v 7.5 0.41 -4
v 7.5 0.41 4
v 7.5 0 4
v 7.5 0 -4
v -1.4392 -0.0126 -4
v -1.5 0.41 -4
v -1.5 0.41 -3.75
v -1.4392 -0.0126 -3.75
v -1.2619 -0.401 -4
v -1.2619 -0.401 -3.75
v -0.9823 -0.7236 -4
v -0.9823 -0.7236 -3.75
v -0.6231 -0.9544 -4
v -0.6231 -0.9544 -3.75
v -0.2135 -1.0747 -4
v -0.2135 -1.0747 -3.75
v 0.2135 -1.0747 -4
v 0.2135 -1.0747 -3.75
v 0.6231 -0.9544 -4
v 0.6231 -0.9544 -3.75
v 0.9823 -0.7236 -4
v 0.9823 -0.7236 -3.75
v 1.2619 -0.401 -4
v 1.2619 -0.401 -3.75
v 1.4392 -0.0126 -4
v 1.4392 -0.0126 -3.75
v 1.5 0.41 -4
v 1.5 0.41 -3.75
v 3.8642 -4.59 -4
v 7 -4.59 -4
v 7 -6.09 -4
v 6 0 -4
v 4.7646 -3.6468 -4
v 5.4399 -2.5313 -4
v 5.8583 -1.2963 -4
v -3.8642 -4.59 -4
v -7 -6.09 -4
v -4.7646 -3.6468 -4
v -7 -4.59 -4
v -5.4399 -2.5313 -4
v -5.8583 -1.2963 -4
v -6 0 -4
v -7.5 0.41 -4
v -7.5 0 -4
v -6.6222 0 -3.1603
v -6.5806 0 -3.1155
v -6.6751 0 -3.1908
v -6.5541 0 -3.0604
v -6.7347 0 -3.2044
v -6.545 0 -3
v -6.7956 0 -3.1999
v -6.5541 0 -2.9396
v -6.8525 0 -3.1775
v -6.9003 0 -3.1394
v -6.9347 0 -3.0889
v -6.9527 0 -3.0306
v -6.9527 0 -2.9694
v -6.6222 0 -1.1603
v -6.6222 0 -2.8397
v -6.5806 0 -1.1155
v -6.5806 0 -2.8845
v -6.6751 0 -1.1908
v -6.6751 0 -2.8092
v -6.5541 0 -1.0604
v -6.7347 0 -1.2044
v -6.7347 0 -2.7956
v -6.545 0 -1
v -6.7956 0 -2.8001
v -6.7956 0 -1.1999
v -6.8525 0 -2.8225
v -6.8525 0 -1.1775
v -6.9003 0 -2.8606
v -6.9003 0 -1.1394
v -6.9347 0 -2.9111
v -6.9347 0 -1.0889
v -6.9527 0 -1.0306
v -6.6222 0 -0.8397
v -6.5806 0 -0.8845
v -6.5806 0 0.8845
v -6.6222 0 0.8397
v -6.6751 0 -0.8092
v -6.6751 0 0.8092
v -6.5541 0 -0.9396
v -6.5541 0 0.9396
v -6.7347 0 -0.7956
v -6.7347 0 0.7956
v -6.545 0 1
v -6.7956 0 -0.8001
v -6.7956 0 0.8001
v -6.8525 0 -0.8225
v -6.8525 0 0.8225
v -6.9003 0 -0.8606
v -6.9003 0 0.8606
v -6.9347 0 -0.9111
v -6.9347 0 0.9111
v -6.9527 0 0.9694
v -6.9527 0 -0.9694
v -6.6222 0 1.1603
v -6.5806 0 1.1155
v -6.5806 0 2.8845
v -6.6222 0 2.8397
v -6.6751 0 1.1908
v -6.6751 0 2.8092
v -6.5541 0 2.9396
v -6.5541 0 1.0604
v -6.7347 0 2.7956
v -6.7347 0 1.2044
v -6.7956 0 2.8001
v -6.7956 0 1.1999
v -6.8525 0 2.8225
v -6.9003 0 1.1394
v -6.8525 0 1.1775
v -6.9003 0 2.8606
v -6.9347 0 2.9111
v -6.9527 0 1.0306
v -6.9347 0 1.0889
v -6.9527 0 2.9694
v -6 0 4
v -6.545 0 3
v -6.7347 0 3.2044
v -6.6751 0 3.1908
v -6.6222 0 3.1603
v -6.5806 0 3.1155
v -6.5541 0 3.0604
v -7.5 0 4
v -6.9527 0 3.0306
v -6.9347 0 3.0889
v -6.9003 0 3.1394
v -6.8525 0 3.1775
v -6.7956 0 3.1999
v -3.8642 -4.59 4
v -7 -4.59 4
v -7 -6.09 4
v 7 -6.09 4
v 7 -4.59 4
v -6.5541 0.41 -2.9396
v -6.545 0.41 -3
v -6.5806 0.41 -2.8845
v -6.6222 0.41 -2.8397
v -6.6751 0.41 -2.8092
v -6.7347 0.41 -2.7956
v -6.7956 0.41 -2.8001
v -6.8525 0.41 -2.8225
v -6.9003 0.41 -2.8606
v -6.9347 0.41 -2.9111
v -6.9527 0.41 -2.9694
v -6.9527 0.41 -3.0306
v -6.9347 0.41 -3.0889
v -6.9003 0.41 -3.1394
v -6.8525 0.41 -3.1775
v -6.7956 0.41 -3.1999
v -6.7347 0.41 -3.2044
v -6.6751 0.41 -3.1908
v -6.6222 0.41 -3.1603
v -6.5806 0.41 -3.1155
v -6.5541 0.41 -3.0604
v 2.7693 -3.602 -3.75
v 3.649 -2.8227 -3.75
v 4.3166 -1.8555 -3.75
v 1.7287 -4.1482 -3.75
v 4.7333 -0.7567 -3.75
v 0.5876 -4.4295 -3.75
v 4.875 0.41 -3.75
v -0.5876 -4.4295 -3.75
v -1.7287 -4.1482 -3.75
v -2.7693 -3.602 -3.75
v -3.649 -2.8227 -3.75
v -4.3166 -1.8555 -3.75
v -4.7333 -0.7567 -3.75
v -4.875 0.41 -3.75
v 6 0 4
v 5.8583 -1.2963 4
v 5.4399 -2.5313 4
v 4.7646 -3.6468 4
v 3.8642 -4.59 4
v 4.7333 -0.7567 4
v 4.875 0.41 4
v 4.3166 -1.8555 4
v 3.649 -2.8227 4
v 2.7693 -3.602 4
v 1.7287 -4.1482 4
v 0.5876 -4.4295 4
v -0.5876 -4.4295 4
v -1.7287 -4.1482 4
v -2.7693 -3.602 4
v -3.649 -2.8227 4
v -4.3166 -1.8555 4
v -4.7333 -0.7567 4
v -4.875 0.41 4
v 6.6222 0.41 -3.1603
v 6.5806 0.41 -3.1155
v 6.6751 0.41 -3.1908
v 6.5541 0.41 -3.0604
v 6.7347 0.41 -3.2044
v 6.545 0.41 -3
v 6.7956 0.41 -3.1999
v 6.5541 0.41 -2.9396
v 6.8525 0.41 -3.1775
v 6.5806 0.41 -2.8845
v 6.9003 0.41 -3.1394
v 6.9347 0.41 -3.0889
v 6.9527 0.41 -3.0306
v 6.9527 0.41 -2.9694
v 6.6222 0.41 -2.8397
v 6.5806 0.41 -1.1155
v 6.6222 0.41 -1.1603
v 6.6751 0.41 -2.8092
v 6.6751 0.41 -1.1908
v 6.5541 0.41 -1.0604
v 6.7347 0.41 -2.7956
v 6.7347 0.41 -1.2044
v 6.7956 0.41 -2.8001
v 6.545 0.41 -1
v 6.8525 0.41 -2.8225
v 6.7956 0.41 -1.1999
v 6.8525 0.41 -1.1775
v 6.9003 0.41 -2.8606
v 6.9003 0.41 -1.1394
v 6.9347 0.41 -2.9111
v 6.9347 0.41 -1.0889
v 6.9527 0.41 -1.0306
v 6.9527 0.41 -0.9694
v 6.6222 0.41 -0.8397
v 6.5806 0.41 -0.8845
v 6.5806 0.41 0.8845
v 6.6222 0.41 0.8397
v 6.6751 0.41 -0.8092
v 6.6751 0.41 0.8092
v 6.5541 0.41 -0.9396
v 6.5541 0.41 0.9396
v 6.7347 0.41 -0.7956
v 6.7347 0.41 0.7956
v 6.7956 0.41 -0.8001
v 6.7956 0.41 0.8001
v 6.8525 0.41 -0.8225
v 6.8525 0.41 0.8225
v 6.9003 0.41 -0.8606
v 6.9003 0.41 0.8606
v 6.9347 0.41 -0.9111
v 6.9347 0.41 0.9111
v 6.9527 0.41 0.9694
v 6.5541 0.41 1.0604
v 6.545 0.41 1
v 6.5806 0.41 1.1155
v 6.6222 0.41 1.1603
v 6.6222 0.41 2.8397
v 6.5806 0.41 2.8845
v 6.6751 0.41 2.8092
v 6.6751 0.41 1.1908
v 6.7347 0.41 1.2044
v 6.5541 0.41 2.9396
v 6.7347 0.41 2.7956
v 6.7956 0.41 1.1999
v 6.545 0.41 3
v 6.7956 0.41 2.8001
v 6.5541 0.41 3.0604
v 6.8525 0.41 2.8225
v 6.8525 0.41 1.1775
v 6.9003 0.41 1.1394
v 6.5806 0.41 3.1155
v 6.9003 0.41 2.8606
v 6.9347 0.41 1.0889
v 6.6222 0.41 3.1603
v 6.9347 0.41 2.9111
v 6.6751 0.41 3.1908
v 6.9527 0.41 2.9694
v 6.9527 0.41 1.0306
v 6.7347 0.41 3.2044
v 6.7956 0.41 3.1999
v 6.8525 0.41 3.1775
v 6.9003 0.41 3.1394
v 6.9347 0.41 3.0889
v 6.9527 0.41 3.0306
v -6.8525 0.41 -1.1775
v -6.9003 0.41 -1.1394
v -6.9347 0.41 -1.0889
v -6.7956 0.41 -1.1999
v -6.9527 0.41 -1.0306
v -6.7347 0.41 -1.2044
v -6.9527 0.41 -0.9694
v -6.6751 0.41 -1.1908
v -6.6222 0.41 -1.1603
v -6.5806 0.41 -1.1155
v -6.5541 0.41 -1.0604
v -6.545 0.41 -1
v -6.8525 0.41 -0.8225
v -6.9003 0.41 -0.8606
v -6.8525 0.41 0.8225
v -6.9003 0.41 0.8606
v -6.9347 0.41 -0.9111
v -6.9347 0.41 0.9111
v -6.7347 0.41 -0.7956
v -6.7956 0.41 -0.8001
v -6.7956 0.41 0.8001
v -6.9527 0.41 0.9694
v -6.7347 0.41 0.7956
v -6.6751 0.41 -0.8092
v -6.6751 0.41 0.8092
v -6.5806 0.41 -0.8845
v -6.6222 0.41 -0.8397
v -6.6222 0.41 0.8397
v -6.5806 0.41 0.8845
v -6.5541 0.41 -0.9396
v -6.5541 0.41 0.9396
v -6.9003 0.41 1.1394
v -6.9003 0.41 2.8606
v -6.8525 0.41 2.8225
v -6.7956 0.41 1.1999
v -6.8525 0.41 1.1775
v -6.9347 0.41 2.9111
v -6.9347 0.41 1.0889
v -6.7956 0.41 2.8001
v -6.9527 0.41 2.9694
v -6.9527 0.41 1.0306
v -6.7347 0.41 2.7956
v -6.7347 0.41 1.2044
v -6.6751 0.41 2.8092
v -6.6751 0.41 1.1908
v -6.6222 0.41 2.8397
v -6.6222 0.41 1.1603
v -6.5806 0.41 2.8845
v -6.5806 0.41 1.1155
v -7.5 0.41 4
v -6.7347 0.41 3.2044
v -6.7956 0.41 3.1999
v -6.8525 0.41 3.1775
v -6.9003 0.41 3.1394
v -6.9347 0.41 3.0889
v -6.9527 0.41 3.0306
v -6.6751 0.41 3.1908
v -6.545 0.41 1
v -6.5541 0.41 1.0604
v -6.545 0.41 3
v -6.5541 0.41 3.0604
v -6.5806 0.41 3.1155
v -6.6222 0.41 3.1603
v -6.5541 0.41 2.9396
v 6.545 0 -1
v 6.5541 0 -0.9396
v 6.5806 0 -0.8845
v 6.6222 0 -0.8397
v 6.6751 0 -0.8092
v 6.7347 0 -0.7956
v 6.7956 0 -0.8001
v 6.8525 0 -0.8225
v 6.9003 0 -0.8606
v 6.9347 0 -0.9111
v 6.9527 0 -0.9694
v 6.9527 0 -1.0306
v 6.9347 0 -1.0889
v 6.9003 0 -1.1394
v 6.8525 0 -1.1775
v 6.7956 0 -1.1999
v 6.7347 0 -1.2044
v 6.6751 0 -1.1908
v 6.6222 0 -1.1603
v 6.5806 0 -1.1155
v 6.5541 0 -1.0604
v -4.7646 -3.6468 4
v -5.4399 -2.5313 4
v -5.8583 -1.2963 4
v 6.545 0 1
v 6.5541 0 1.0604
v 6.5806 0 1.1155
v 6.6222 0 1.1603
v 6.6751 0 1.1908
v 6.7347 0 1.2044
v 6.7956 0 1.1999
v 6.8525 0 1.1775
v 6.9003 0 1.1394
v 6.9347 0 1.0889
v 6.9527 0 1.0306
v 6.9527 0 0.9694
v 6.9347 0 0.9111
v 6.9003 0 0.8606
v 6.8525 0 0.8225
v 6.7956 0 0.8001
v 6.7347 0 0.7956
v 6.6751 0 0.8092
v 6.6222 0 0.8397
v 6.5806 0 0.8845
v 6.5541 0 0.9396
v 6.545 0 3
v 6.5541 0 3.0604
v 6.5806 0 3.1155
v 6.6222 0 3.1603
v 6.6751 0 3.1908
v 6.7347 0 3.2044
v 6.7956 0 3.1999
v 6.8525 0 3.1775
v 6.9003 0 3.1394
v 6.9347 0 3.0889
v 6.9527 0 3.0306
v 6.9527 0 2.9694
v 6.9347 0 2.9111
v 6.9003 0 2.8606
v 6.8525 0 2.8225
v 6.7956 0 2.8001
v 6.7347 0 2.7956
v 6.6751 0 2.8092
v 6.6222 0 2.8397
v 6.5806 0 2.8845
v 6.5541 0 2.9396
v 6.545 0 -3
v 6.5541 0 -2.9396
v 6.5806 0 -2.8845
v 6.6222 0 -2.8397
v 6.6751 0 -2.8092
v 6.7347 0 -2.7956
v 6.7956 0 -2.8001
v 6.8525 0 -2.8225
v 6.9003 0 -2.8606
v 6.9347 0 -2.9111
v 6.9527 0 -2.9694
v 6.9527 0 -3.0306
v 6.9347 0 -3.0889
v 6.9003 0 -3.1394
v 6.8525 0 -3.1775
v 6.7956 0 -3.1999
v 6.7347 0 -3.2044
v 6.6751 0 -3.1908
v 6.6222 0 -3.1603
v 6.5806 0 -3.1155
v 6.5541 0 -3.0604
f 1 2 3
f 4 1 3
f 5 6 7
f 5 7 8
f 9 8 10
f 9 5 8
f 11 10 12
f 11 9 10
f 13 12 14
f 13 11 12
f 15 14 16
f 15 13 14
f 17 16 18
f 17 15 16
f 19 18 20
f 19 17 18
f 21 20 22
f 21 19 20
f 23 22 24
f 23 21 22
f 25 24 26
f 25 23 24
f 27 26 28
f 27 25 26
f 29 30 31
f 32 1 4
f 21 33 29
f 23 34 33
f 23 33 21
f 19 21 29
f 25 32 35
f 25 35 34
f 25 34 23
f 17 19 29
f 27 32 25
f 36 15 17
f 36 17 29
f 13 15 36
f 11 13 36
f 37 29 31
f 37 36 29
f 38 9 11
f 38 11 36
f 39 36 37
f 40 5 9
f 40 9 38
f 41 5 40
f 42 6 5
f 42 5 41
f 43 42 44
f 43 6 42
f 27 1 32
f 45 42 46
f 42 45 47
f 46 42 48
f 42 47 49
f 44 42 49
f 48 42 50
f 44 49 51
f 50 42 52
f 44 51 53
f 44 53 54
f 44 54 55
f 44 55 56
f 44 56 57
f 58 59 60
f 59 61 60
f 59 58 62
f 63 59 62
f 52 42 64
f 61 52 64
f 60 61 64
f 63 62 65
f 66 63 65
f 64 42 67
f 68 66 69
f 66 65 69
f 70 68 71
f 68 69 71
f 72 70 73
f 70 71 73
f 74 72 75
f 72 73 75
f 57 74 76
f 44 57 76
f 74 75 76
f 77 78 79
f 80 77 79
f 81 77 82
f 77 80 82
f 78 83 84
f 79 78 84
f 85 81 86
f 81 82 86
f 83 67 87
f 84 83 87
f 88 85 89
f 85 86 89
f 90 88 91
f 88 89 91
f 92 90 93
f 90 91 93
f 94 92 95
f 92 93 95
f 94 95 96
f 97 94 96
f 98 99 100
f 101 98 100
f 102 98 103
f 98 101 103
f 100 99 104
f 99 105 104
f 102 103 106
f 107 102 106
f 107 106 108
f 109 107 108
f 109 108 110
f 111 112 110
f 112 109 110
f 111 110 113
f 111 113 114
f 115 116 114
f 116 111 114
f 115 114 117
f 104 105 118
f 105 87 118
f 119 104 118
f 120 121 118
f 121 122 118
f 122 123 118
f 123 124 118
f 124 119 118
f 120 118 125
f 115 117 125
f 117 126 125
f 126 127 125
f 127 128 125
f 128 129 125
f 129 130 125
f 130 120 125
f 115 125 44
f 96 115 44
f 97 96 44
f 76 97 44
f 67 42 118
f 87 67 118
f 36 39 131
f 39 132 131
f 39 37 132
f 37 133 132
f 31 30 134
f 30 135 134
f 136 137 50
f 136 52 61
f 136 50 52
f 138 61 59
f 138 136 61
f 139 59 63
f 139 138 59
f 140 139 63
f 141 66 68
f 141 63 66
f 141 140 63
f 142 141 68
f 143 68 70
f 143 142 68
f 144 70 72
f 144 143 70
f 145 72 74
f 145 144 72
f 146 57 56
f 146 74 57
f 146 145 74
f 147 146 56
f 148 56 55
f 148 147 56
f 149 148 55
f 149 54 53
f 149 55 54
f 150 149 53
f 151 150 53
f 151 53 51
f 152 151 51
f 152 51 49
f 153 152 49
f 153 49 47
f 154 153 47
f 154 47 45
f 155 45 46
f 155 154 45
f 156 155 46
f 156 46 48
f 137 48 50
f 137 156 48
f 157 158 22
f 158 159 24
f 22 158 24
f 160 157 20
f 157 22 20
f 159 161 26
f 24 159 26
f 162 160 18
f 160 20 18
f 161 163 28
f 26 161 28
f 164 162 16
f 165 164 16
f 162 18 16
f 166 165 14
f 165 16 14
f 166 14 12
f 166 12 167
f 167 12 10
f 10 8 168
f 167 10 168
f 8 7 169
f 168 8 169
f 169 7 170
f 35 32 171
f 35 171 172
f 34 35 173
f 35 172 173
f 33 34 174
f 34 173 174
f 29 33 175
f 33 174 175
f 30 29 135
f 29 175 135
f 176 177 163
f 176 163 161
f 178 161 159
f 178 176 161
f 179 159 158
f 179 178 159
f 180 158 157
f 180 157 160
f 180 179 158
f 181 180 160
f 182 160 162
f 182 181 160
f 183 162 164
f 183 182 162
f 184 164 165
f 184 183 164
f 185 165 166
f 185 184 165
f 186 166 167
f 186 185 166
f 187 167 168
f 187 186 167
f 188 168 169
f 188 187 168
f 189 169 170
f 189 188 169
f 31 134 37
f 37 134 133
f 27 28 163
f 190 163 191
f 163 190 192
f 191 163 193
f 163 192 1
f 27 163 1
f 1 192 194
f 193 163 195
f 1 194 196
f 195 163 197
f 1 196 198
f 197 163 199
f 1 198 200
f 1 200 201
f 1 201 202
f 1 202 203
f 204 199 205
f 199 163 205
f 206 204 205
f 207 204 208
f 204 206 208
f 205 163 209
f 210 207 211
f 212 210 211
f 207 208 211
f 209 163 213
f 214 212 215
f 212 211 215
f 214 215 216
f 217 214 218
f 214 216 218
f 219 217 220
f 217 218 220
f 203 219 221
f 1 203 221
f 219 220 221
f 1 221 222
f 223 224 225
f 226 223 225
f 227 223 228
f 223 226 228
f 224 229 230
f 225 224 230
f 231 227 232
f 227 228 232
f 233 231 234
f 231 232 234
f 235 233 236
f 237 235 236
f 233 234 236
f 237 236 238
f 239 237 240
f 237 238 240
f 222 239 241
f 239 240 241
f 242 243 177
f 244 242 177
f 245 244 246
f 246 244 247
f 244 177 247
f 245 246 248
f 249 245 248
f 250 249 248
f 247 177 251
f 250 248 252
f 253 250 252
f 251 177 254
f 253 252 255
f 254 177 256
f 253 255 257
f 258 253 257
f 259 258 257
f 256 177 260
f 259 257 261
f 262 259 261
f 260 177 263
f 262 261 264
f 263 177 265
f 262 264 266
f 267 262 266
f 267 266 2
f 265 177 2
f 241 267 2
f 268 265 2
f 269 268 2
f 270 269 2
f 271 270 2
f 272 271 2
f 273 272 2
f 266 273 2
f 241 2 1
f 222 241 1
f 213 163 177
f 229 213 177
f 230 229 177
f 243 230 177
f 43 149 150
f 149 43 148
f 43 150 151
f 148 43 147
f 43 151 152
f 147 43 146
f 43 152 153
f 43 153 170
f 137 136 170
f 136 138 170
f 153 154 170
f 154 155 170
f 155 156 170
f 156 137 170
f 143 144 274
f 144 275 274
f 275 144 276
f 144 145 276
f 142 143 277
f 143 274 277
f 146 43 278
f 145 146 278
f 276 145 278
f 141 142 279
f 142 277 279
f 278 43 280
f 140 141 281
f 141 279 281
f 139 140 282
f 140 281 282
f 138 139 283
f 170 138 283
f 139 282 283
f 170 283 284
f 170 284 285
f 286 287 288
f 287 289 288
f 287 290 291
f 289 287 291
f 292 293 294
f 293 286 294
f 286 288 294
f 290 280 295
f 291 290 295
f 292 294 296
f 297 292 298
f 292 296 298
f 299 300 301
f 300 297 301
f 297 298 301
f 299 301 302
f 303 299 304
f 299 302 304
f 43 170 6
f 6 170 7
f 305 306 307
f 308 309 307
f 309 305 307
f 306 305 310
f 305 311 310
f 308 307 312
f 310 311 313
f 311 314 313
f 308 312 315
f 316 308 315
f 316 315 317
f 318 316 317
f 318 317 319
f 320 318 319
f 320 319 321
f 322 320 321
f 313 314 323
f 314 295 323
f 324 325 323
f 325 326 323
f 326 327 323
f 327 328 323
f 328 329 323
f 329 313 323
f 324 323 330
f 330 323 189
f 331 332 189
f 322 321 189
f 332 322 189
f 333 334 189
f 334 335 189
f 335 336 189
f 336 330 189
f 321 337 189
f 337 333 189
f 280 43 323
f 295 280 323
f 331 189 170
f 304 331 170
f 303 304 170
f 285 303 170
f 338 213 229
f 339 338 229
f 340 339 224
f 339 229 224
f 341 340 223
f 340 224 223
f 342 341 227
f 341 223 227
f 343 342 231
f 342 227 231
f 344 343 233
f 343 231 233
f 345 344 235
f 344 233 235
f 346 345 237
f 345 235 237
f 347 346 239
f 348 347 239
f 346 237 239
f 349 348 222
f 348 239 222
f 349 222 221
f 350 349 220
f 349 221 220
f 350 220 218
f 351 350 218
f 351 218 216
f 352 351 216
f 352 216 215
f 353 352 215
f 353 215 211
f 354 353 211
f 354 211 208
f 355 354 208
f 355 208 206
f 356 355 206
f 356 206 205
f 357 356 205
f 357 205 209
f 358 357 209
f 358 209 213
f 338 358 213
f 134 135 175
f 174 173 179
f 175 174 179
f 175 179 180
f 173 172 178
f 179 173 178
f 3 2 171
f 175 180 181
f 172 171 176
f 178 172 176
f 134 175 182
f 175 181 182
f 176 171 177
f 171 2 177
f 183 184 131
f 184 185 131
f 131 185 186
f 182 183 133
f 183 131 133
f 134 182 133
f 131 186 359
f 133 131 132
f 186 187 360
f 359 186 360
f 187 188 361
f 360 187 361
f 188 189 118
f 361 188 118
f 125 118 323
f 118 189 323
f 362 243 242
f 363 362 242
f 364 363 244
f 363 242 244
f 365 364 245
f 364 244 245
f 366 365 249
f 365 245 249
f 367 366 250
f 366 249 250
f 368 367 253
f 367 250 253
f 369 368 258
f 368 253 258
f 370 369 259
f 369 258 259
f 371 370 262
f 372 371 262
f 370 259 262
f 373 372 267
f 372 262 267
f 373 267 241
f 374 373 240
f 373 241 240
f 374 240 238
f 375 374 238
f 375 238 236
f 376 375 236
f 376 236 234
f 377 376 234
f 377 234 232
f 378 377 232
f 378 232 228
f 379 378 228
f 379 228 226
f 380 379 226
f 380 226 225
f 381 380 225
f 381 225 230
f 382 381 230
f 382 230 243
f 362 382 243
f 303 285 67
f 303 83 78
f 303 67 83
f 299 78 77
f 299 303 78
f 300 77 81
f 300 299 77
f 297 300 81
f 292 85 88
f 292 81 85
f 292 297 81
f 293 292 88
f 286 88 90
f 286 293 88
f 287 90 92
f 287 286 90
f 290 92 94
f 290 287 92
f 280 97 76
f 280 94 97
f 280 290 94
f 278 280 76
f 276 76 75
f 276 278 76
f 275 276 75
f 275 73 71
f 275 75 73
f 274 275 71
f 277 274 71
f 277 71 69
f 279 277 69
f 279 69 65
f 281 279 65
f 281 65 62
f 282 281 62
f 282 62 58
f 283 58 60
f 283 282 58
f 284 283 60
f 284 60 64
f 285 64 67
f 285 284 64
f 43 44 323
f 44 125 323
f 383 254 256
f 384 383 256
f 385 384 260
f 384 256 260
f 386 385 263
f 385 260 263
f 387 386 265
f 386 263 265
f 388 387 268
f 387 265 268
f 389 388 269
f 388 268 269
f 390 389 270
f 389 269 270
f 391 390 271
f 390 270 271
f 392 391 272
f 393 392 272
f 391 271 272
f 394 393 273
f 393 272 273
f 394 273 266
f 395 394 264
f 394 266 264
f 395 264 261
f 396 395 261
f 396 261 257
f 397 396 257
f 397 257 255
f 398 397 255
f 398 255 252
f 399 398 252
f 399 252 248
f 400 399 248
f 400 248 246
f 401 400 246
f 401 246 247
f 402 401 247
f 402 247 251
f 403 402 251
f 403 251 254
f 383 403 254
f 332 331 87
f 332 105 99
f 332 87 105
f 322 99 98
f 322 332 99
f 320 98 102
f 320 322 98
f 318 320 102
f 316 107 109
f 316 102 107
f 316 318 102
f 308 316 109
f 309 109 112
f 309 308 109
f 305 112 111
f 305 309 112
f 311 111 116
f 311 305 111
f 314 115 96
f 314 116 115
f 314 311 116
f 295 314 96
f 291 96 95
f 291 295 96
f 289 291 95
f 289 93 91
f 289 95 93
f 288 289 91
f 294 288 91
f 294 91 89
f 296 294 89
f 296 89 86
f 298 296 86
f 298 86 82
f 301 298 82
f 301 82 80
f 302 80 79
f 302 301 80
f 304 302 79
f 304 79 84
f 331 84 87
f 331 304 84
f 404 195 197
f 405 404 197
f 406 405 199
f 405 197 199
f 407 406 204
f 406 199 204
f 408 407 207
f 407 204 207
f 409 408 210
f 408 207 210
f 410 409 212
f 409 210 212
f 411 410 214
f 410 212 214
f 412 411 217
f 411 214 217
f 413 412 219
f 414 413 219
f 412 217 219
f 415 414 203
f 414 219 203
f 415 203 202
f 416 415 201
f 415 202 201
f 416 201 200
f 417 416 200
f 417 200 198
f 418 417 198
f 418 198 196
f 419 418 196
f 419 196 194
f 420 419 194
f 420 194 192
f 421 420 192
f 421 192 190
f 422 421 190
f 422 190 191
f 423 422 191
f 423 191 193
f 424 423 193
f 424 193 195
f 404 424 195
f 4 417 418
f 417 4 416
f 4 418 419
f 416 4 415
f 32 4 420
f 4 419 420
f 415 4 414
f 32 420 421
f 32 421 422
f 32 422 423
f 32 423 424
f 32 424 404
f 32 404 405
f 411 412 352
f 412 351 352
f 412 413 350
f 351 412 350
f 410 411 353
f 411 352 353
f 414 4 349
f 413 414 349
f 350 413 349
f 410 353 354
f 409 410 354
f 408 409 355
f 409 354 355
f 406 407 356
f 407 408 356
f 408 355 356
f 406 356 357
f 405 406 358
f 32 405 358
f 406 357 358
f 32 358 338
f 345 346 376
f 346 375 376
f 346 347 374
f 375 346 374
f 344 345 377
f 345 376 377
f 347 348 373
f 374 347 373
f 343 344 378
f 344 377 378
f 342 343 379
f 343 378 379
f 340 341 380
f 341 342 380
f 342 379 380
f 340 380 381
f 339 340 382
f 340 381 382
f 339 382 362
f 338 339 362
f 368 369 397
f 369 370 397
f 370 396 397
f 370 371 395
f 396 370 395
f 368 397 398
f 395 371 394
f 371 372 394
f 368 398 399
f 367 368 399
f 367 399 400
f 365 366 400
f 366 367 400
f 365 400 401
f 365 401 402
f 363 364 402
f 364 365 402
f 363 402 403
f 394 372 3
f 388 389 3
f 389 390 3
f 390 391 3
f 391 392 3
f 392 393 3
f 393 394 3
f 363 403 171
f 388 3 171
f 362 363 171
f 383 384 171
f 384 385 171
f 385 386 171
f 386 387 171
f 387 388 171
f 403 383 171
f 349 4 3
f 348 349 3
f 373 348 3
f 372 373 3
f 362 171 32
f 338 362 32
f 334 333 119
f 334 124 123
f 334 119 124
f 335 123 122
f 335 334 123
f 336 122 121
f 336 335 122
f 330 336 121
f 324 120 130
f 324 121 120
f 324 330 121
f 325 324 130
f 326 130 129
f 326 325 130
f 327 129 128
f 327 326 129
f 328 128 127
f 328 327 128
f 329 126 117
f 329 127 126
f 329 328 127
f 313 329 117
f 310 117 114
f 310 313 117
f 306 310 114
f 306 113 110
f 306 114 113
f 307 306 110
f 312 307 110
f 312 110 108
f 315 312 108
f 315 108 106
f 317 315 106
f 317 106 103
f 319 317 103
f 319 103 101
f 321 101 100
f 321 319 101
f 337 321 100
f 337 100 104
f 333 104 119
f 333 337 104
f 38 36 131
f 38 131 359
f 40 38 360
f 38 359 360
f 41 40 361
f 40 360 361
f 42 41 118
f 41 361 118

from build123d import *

# Parameters (mm, degrees)
BOSS_EXTRUDE1_DEPTH = 4
CUT_EXTRUDE1_DEPTH  = 7.75
CUT_EXTRUDE2_DEPTH  = 7.75
SKETCH4_R           = 0.205
CUT_EXTRUDE3_DEPTH  = 2.75


with BuildPart() as part:
    # Sketch1 → Boss-Extrude1 (new, symmetric)
    with BuildSketch(Plane.XY):
        with BuildLine():
            Line((7.5, 0), (6, 0))
            ThreePointArc((6, 0), (5.439903034, -2.531295119), (3.864181673, -4.59))
            Line((3.864181673, -4.59), (7, -4.59))
            Line((7, -4.59), (7, -6.09))
            Line((7, -6.09), (-7, -6.09))
            Line((-7, -6.09), (-7, -4.59))
            Line((-7, -4.59), (-3.864181673, -4.59))
            ThreePointArc((-3.864181673, -4.59), (-5.439903034, -2.531295119), (-6, 0))
            Line((-6, 0), (-7.5, 0))
            Line((-7.5, 0), (-7.5, 0.41))
            Line((-7.5, 0.41), (7.5, 0.41))
            Line((7.5, 0.41), (7.5, 0))
        make_face()
    extrude(amount=BOSS_EXTRUDE1_DEPTH, both=True)

    # Sketch2 → Cut-Extrude1 (cut)
    with BuildSketch(Plane.XY.offset(4)):
        with BuildLine():
            Line((-4.875, 0.41), (4.875, 0.41))
            ThreePointArc((4.875, 0.41), (0, -4.465), (-4.875, 0.41))
        make_face()
    extrude(amount=-CUT_EXTRUDE1_DEPTH, mode=Mode.SUBTRACT)

    # Sketch3 → Cut-Extrude2 (cut)
    with BuildSketch(Plane(origin=(0, 0, -4), x_dir=(-1, 0, 0), z_dir=(0, 0, -1))):
        with BuildLine():
            Line((-1.5, 0.41), (1.5, 0.41))
            ThreePointArc((1.5, 0.41), (0, -1.09), (-1.5, 0.41))
        make_face()
    extrude(amount=-CUT_EXTRUDE2_DEPTH, mode=Mode.SUBTRACT)

    # Sketch4 → Cut-Extrude3 (cut)
    with BuildSketch(Plane(origin=(0, 0.41, 0), x_dir=(1, 0, 0), z_dir=(0, 1, 0))):
        with Locations(Location((6.75, 3, 0), (0, 0, 180))):
            Circle(SKETCH4_R)
        with Locations(Location((6.75, 1, 0), (0, 0, 180))):
            Circle(SKETCH4_R)
        with Locations(Location((6.75, -1, 0), (0, 0, 180))):
            Circle(SKETCH4_R)
        with Locations(Location((6.75, -3, 0), (0, 0, 180))):
            Circle(SKETCH4_R)
    cut_extrude3 = extrude(amount=-CUT_EXTRUDE3_DEPTH, mode=Mode.SUBTRACT)

    # Mirror1: Cut-Extrude3 across plane
    add(cut_extrude3.mirror(Plane(origin=(0, 0, 0), x_dir=(0, 0, 1), z_dir=(1, 0, 0))), mode=Mode.SUBTRACT)


solid = part.part
